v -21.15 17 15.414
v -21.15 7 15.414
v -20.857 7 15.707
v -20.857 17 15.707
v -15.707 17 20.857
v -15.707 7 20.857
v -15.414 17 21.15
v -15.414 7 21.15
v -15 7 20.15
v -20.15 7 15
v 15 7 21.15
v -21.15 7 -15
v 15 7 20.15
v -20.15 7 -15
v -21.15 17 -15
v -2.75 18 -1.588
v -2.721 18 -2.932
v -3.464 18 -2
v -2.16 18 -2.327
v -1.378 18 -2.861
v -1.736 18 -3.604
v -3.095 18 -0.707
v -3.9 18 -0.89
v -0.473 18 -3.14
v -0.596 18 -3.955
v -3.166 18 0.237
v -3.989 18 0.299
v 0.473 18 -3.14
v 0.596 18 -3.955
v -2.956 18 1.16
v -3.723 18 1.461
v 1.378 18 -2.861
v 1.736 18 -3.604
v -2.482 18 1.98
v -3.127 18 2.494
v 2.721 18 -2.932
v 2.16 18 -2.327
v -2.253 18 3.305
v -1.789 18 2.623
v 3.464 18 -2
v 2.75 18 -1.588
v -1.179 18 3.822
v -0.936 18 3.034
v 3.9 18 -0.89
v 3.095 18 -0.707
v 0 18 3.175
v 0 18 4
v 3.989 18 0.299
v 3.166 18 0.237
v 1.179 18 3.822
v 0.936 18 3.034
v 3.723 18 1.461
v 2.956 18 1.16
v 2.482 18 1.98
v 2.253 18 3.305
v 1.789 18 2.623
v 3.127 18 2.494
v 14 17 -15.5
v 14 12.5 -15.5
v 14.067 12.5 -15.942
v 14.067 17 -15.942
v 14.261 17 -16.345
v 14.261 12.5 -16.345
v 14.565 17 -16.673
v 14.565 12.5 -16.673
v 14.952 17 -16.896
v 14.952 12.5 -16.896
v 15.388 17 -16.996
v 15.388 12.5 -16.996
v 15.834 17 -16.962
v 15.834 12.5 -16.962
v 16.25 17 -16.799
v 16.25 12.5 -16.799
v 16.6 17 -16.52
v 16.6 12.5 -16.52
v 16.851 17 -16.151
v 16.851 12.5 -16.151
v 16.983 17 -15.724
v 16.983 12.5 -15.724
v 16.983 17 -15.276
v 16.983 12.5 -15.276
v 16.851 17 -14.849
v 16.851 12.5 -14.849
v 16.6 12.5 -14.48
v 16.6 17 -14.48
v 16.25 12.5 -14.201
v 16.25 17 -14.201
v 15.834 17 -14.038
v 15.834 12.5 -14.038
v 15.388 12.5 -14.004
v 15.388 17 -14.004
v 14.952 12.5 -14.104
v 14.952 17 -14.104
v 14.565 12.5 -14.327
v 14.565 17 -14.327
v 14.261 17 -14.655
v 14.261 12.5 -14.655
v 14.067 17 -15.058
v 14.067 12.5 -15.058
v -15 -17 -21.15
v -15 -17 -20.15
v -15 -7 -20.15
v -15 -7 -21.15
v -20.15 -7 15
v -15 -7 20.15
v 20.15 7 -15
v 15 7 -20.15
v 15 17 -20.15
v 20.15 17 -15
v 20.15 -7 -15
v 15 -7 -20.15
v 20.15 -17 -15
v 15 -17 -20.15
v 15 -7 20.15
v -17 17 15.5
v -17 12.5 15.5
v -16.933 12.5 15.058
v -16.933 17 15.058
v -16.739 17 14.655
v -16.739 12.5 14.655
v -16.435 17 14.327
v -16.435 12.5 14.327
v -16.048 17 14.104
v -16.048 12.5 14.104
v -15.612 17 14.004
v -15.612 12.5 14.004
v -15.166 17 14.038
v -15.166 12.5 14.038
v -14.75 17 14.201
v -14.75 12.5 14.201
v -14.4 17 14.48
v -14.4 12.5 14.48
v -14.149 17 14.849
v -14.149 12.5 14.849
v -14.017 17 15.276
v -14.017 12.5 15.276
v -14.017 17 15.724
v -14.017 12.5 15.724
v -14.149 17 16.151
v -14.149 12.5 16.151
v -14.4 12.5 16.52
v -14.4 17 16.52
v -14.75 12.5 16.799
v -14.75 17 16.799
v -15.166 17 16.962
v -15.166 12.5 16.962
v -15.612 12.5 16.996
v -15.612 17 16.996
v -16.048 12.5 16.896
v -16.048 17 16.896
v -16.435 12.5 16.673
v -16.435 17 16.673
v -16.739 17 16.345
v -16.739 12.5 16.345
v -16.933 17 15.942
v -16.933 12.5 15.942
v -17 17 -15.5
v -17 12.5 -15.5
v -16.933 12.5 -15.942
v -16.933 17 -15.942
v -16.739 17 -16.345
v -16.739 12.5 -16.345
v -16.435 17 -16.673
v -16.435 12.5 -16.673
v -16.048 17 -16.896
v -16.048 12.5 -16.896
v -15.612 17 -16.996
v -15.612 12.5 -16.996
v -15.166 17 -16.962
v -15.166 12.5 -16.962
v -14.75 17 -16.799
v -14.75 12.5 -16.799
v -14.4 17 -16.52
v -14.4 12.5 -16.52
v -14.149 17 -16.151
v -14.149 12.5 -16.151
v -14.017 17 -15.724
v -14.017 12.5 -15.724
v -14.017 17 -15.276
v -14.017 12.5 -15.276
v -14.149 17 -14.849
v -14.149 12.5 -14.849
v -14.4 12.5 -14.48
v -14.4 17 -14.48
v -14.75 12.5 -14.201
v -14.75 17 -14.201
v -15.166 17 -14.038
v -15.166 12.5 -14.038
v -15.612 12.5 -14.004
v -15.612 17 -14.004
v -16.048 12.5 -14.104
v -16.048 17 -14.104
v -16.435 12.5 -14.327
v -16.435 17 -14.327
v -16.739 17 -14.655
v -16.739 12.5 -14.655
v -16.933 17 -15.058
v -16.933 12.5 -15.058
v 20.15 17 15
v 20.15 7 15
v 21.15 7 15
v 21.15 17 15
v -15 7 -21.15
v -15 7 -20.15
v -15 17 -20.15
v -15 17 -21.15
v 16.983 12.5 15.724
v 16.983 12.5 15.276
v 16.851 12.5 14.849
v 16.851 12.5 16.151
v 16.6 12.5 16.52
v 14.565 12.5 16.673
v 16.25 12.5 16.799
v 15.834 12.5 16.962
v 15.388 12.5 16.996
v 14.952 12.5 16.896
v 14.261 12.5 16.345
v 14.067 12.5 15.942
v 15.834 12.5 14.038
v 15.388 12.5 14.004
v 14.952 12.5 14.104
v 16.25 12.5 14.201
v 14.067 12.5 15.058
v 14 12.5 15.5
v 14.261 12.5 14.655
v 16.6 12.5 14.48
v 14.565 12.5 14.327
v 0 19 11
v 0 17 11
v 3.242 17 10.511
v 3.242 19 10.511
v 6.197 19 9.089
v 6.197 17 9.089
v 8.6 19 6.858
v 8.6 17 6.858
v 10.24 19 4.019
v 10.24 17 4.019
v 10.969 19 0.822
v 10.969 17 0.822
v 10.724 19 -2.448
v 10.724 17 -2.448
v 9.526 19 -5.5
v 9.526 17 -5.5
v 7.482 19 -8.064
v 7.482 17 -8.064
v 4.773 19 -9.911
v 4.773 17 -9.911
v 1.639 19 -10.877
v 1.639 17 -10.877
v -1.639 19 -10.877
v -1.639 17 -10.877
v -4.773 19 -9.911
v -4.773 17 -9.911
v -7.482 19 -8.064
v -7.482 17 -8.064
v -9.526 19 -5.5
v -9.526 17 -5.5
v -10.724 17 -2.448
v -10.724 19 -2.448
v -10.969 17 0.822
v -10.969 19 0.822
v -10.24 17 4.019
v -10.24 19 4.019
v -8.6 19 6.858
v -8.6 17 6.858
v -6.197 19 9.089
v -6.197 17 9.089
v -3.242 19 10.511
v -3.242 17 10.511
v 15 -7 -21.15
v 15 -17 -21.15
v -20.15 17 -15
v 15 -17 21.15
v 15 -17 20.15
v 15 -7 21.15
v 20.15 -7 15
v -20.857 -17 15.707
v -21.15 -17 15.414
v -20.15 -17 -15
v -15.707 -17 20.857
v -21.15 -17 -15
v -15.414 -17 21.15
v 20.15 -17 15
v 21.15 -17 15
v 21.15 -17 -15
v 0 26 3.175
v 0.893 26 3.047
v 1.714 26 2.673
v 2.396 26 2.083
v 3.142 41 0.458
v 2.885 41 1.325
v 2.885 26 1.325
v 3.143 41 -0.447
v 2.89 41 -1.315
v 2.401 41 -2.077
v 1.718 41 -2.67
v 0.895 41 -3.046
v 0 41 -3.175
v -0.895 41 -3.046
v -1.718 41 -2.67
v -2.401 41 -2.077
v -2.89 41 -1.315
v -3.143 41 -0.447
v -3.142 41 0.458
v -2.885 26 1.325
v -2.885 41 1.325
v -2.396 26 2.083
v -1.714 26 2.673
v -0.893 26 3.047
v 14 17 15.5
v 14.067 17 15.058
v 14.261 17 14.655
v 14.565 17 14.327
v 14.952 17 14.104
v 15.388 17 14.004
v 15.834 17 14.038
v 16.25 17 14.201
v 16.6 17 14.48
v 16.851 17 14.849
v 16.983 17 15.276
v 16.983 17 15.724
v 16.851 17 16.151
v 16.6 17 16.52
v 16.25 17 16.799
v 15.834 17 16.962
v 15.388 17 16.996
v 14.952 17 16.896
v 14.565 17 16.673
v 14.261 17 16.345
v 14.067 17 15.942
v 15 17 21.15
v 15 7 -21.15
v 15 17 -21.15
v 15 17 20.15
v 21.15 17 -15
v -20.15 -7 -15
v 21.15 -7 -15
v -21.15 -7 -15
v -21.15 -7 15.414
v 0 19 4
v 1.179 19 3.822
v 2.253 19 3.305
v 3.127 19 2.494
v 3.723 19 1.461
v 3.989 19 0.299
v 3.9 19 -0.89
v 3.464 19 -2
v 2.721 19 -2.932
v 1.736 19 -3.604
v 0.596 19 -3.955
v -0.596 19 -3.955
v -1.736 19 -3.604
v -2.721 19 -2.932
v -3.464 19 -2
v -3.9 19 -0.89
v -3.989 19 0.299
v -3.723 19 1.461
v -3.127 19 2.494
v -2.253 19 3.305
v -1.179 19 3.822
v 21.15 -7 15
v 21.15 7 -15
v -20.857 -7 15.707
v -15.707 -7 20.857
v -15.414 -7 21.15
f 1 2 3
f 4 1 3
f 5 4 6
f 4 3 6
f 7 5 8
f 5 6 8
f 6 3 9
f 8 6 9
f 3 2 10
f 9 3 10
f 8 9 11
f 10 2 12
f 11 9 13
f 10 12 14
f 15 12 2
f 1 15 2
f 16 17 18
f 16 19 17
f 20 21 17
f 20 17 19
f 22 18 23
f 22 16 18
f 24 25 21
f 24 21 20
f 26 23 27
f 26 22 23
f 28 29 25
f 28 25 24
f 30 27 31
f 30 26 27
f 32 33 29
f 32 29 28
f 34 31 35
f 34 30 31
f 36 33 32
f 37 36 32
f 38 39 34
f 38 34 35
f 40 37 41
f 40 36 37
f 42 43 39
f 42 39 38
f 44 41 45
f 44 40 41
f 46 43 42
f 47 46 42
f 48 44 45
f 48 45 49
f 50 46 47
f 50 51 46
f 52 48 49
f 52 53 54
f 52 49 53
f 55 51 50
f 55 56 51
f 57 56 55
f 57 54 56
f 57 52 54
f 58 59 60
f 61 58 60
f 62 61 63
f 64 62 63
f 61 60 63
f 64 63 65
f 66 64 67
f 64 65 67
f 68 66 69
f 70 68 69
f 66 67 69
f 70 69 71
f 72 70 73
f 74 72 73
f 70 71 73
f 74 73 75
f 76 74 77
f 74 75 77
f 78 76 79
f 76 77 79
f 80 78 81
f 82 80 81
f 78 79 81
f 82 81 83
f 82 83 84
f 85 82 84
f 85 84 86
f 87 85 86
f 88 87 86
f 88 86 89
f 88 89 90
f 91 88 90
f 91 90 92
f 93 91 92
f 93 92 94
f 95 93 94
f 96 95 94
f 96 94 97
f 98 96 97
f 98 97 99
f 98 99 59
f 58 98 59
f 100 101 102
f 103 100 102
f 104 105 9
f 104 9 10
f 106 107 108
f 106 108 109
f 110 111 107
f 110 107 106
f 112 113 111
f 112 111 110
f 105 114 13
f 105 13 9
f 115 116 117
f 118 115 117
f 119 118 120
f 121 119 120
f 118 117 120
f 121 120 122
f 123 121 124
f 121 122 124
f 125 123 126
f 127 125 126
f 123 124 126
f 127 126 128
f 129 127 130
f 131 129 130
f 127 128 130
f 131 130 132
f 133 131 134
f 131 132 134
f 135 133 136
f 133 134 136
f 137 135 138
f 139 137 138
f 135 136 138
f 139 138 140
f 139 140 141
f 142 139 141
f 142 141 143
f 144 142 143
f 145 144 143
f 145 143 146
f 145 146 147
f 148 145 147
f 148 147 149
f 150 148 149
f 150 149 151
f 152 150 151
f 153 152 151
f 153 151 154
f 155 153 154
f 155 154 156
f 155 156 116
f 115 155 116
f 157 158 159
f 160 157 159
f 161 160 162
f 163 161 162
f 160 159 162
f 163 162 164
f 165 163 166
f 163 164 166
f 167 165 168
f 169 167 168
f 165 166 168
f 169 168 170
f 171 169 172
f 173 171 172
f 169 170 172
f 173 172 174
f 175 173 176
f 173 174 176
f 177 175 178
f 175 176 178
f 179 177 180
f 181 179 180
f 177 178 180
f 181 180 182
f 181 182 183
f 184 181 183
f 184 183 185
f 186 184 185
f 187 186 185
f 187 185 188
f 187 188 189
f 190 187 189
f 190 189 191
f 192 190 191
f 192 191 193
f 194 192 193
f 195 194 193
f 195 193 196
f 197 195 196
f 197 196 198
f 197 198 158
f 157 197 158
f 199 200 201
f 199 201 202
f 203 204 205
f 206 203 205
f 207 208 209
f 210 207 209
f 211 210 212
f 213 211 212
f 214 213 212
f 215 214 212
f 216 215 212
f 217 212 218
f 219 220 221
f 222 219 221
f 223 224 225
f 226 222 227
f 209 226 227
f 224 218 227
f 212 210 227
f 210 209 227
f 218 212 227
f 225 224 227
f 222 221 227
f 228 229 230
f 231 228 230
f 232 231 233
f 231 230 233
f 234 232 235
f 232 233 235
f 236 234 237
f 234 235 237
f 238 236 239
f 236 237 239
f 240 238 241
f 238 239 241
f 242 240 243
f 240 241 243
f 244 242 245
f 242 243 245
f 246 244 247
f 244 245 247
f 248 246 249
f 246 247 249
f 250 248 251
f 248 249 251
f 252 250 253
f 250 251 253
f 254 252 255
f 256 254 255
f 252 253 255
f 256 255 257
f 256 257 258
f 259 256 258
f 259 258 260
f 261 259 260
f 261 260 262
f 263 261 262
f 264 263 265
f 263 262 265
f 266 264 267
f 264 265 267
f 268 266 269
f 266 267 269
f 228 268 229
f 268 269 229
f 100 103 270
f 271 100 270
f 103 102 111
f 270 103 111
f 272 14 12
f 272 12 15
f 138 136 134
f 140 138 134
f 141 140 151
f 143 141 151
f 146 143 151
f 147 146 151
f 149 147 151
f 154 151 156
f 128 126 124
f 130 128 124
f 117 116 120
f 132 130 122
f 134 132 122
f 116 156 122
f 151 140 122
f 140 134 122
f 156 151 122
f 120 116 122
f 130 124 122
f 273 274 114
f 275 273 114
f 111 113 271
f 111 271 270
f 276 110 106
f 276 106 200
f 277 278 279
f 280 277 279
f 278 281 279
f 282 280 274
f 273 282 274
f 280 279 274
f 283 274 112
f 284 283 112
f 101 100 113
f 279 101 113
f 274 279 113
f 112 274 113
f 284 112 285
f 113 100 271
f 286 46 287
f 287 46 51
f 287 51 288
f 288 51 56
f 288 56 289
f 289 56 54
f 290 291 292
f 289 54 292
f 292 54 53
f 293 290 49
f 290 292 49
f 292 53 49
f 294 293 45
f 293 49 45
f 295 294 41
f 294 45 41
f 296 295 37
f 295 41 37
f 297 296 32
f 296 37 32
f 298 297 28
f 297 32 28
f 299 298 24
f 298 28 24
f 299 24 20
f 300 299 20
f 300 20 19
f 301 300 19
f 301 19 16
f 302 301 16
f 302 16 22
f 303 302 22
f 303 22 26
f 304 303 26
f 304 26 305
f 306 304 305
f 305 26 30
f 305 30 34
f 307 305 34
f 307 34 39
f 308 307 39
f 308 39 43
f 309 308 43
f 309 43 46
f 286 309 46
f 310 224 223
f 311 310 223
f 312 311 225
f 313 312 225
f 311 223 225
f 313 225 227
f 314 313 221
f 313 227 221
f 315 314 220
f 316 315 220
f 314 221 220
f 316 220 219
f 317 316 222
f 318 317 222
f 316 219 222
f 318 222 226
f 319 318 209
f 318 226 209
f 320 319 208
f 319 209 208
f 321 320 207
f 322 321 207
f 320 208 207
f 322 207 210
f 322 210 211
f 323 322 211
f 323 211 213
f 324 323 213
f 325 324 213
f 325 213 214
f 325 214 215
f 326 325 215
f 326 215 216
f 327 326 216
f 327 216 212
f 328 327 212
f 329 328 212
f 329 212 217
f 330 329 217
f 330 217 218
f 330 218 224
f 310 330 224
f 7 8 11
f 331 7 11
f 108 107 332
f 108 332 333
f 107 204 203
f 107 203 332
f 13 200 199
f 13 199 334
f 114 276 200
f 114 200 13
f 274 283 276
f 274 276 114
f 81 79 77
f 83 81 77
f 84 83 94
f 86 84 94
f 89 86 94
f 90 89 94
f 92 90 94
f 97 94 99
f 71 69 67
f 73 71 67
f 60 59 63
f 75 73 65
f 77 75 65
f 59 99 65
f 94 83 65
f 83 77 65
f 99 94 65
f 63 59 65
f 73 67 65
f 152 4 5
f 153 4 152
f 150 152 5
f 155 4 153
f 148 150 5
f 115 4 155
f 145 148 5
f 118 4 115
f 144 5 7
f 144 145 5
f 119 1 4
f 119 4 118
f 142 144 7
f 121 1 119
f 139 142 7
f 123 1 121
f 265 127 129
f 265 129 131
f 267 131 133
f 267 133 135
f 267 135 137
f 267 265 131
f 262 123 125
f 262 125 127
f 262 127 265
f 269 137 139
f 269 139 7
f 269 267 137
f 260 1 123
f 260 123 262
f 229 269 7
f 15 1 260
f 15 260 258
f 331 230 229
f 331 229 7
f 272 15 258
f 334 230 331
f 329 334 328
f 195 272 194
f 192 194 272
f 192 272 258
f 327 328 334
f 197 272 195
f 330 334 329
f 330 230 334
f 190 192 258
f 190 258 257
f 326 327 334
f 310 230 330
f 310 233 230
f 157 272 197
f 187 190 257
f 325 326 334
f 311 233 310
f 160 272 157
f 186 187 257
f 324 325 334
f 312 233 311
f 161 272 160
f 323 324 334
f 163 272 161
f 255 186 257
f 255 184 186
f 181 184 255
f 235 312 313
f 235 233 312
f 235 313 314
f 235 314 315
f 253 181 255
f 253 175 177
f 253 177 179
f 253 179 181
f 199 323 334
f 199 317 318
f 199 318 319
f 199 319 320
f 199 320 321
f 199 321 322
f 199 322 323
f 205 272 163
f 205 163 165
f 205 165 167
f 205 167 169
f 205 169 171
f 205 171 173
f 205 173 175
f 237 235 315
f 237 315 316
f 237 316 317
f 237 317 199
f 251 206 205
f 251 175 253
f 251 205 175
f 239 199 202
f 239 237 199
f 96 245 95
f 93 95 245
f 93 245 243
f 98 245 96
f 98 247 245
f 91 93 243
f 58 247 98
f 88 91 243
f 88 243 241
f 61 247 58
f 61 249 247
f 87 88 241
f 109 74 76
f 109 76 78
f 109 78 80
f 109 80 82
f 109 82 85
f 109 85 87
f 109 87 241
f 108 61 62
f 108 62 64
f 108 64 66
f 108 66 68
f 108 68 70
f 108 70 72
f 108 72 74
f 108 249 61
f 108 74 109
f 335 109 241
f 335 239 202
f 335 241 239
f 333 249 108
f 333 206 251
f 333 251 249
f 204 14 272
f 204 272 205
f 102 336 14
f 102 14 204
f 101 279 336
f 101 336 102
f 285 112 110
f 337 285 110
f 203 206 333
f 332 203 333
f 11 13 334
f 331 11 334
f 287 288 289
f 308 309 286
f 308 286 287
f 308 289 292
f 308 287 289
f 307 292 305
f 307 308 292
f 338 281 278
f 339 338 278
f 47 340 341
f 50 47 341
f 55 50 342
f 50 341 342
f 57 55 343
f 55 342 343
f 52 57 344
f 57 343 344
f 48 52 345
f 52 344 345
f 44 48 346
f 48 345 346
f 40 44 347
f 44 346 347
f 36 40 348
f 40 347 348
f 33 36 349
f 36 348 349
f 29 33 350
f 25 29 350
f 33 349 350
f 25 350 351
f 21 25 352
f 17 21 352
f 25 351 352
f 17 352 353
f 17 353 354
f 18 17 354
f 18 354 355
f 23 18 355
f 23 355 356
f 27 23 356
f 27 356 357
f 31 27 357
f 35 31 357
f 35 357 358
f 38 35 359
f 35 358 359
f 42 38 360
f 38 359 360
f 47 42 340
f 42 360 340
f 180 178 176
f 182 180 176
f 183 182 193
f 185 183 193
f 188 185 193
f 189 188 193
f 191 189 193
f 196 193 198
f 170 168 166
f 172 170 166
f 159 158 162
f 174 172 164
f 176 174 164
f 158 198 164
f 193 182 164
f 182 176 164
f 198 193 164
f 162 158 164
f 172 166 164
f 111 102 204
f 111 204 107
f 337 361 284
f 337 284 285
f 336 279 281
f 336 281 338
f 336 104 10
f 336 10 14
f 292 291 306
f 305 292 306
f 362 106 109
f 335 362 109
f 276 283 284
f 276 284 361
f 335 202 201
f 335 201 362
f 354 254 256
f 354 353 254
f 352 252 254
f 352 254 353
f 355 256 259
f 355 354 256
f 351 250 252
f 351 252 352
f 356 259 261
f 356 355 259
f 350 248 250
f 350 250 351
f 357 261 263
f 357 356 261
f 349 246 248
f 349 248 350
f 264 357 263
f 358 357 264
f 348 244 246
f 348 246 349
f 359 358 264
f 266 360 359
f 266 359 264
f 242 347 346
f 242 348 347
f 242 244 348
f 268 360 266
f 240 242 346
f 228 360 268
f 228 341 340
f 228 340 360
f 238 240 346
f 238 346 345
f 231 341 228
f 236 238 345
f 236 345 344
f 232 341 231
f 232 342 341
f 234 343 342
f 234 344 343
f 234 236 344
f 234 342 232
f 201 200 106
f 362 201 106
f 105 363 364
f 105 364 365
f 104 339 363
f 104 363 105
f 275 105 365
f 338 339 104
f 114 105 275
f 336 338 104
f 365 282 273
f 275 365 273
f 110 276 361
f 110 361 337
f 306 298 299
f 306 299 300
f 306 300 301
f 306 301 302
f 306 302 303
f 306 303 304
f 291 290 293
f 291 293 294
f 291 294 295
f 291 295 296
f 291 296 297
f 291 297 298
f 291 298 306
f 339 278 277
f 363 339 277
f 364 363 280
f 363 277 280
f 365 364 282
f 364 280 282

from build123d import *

# Parameters (mm, degrees)
EXTRUSION1_DEPTH      = 17
EXTRUSION1_DEPTH_BACK = 17
SKETCH2_R             = 11
EXTRUSION3_DEPTH      = 2
SKETCH3_R             = 4
EXTRUSION4_DEPTH      = 1
SKETCH4_R             = 3.175
EXTRUSION5_DEPTH      = 23
SKETCH5_W             = 30
SKETCH5_H             = 10
EXTRUSION6_DEPTH      = 1
SKETCH6_W             = 30
SKETCH6_H             = 10
EXTRUSION7_DEPTH      = 1
SKETCH7_W             = 7.283199846
SKETCH7_H             = 10
EXTRUSION8_DEPTH      = 1
EXTRUSION9_START      = -17
EXTRUSION9_DEPTH      = 10
EXTRUSION9_START_2    = 7
EXTRUSION9_2_DEPTH    = 10
EXTRUSION10_START     = -17
EXTRUSION10_DEPTH     = 10
EXTRUSION10_START_2   = 7
EXTRUSION10_2_DEPTH   = 10
HOLE3_D               = 3
HOLE3_DEPTH           = 4.5
EXTRUSION12_START     = -15
EXTRUSION12_DEPTH     = 15


# Read off the part's stored shape, not the designer's step: Extrusion9, Extrusion10
with BuildPart() as part:
    # Sketch1 → Extrusion1 (new, two sides: drawn at the far end of the back side and taken through both)
    with BuildSketch(Plane(origin=(0, 0, 0), x_dir=(-1, 0, 0), z_dir=(0, 1, 0)).offset(-EXTRUSION1_DEPTH_BACK)):
        Polygon((15, 20.15), (20.15, 15), (20.15, -15), (15, -20.15), (-15, -20.15), (-20.15, -15), (-20.15, 15), (-15, 20.15), align=None)
    extrude(amount=EXTRUSION1_DEPTH + EXTRUSION1_DEPTH_BACK)

    # Sketch2 → Extrusion3 (add)
    with BuildSketch(Plane(origin=(0, 17, 0), x_dir=(-1, 0, 0), z_dir=(0, 1, 0))):
        with Locations(Location((0, 0, 0), (0, 0, 90))):
            Circle(SKETCH2_R)
    extrude(amount=EXTRUSION3_DEPTH)

    # Sketch3 → Extrusion4 (cut)
    with BuildSketch(Plane(origin=(0, 19, 0), x_dir=(-1, 0, 0), z_dir=(0, 1, 0))):
        with Locations(Location((0, 0, 0), (0, 0, 90))):
            Circle(SKETCH3_R)
    extrude(amount=-EXTRUSION4_DEPTH, mode=Mode.SUBTRACT)

    # Sketch4 → Extrusion5 (add)
    with BuildSketch(Plane(origin=(0, 18, 0), x_dir=(-1, 0, 0), z_dir=(0, 1, 0))):
        with Locations(Location((0, 0, 0), (0, 0, 90))):
            Circle(SKETCH4_R)
    extrude(amount=EXTRUSION5_DEPTH)

    # Sketch5 → Extrusion6 (add)
    with BuildSketch(Plane.XY.offset(20.15)):
        with Locations((0, 12)):
            Rectangle(SKETCH5_W, SKETCH5_H)
        with Locations((0, -12)):
            Rectangle(SKETCH5_W, SKETCH5_H)
    extrusion6 = extrude(amount=EXTRUSION6_DEPTH)

    # Mirror1: Extrusion6 across plane
    add(extrusion6.mirror(Plane.XY))

    # Sketch6 → Extrusion7 (add)
    with BuildSketch(Plane(origin=(20.15, 0, 0), x_dir=(0, 0, -1), z_dir=(1, 0, 0))):
        with Locations((0, 12)):
            Rectangle(SKETCH6_W, SKETCH6_H)
        with Locations((0, -12)):
            Rectangle(SKETCH6_W, SKETCH6_H)
    extrusion7 = extrude(amount=EXTRUSION7_DEPTH)

    # Mirror2: Extrusion7 across plane
    add(extrusion7.mirror(Plane(origin=(0, 0, 0), x_dir=(0, 0, 1), z_dir=(1, 0, 0))))

    # Sketch7 → Extrusion8 (add)
    with BuildSketch(Plane(origin=(-17.575, 0, 17.575), x_dir=(0.7071067811865475, 0, 0.7071067811865477), z_dir=(-0.7071067811865477, 0, 0.7071067811865475))):
        with Locations((0, 12)):
            Rectangle(SKETCH7_W, SKETCH7_H)
        with Locations((0, -12)):
            Rectangle(SKETCH7_W, SKETCH7_H)
    extrude(amount=EXTRUSION8_DEPTH)

    # Extrusion9 outline → Extrusion9 (add)
    with BuildSketch(Plane(origin=(0, 0, 0), x_dir=(1, 0, 0), z_dir=(0, 1, 0)).offset(EXTRUSION9_START)):
        Polygon((-15.414213562, -21.15), (-15, -21.15), (-15, -20.15), (-15.707106781, -20.857106781), align=None)
    extrude(amount=EXTRUSION9_DEPTH)

    # Extrusion9 2 outline → Extrusion9 2 (add)
    with BuildSketch(Plane(origin=(0, 0, 0), x_dir=(1, 0, 0), z_dir=(0, 1, 0)).offset(EXTRUSION9_START_2)):
        Polygon((-15.414213562, -21.15), (-15, -21.15), (-15, -20.15), (-15.707106781, -20.857106781), align=None)
    extrude(amount=EXTRUSION9_2_DEPTH)

    # Extrusion10 outline → Extrusion10 (add)
    with BuildSketch(Plane(origin=(0, 0, 0), x_dir=(1, 0, 0), z_dir=(0, 1, 0)).offset(EXTRUSION10_START)):
        Polygon((-20.15, -15), (-21.15, -15), (-21.15, -15.414213562), (-20.857106781, -15.707106781), align=None)
    extrude(amount=EXTRUSION10_DEPTH)

    # Extrusion10 2 outline → Extrusion10 2 (add)
    with BuildSketch(Plane(origin=(0, 0, 0), x_dir=(1, 0, 0), z_dir=(0, 1, 0)).offset(EXTRUSION10_START_2)):
        Polygon((-20.15, -15), (-21.15, -15), (-21.15, -15.414213562), (-20.857106781, -15.707106781), align=None)
    extrude(amount=EXTRUSION10_2_DEPTH)

    # Hole3
    with Locations(Plane(origin=(0, 17, 0), x_dir=(1, 0, 0), z_dir=(0, 1, 0))):
        with Locations((-15.5, -15.5), (-15.5, 15.5), (15.5, 15.5), (15.5, -15.5)):
            Hole(HOLE3_D / 2, depth=HOLE3_DEPTH)

    # Sketch12 → Extrusion12 (cut)
    with BuildSketch(Plane(origin=(0, 41, 0), x_dir=(-1, 0, 0), z_dir=(0, 1, 0)).offset(EXTRUSION12_START)):
        with BuildLine():
            Line((-2.885307609, 1.325), (2.885307609, 1.325))
            ThreePointArc((2.885307609, 1.325), (0, 3.175), (-2.885307609, 1.325))
        make_face()
    extrude(amount=EXTRUSION12_DEPTH, mode=Mode.SUBTRACT)


solid = part.part
